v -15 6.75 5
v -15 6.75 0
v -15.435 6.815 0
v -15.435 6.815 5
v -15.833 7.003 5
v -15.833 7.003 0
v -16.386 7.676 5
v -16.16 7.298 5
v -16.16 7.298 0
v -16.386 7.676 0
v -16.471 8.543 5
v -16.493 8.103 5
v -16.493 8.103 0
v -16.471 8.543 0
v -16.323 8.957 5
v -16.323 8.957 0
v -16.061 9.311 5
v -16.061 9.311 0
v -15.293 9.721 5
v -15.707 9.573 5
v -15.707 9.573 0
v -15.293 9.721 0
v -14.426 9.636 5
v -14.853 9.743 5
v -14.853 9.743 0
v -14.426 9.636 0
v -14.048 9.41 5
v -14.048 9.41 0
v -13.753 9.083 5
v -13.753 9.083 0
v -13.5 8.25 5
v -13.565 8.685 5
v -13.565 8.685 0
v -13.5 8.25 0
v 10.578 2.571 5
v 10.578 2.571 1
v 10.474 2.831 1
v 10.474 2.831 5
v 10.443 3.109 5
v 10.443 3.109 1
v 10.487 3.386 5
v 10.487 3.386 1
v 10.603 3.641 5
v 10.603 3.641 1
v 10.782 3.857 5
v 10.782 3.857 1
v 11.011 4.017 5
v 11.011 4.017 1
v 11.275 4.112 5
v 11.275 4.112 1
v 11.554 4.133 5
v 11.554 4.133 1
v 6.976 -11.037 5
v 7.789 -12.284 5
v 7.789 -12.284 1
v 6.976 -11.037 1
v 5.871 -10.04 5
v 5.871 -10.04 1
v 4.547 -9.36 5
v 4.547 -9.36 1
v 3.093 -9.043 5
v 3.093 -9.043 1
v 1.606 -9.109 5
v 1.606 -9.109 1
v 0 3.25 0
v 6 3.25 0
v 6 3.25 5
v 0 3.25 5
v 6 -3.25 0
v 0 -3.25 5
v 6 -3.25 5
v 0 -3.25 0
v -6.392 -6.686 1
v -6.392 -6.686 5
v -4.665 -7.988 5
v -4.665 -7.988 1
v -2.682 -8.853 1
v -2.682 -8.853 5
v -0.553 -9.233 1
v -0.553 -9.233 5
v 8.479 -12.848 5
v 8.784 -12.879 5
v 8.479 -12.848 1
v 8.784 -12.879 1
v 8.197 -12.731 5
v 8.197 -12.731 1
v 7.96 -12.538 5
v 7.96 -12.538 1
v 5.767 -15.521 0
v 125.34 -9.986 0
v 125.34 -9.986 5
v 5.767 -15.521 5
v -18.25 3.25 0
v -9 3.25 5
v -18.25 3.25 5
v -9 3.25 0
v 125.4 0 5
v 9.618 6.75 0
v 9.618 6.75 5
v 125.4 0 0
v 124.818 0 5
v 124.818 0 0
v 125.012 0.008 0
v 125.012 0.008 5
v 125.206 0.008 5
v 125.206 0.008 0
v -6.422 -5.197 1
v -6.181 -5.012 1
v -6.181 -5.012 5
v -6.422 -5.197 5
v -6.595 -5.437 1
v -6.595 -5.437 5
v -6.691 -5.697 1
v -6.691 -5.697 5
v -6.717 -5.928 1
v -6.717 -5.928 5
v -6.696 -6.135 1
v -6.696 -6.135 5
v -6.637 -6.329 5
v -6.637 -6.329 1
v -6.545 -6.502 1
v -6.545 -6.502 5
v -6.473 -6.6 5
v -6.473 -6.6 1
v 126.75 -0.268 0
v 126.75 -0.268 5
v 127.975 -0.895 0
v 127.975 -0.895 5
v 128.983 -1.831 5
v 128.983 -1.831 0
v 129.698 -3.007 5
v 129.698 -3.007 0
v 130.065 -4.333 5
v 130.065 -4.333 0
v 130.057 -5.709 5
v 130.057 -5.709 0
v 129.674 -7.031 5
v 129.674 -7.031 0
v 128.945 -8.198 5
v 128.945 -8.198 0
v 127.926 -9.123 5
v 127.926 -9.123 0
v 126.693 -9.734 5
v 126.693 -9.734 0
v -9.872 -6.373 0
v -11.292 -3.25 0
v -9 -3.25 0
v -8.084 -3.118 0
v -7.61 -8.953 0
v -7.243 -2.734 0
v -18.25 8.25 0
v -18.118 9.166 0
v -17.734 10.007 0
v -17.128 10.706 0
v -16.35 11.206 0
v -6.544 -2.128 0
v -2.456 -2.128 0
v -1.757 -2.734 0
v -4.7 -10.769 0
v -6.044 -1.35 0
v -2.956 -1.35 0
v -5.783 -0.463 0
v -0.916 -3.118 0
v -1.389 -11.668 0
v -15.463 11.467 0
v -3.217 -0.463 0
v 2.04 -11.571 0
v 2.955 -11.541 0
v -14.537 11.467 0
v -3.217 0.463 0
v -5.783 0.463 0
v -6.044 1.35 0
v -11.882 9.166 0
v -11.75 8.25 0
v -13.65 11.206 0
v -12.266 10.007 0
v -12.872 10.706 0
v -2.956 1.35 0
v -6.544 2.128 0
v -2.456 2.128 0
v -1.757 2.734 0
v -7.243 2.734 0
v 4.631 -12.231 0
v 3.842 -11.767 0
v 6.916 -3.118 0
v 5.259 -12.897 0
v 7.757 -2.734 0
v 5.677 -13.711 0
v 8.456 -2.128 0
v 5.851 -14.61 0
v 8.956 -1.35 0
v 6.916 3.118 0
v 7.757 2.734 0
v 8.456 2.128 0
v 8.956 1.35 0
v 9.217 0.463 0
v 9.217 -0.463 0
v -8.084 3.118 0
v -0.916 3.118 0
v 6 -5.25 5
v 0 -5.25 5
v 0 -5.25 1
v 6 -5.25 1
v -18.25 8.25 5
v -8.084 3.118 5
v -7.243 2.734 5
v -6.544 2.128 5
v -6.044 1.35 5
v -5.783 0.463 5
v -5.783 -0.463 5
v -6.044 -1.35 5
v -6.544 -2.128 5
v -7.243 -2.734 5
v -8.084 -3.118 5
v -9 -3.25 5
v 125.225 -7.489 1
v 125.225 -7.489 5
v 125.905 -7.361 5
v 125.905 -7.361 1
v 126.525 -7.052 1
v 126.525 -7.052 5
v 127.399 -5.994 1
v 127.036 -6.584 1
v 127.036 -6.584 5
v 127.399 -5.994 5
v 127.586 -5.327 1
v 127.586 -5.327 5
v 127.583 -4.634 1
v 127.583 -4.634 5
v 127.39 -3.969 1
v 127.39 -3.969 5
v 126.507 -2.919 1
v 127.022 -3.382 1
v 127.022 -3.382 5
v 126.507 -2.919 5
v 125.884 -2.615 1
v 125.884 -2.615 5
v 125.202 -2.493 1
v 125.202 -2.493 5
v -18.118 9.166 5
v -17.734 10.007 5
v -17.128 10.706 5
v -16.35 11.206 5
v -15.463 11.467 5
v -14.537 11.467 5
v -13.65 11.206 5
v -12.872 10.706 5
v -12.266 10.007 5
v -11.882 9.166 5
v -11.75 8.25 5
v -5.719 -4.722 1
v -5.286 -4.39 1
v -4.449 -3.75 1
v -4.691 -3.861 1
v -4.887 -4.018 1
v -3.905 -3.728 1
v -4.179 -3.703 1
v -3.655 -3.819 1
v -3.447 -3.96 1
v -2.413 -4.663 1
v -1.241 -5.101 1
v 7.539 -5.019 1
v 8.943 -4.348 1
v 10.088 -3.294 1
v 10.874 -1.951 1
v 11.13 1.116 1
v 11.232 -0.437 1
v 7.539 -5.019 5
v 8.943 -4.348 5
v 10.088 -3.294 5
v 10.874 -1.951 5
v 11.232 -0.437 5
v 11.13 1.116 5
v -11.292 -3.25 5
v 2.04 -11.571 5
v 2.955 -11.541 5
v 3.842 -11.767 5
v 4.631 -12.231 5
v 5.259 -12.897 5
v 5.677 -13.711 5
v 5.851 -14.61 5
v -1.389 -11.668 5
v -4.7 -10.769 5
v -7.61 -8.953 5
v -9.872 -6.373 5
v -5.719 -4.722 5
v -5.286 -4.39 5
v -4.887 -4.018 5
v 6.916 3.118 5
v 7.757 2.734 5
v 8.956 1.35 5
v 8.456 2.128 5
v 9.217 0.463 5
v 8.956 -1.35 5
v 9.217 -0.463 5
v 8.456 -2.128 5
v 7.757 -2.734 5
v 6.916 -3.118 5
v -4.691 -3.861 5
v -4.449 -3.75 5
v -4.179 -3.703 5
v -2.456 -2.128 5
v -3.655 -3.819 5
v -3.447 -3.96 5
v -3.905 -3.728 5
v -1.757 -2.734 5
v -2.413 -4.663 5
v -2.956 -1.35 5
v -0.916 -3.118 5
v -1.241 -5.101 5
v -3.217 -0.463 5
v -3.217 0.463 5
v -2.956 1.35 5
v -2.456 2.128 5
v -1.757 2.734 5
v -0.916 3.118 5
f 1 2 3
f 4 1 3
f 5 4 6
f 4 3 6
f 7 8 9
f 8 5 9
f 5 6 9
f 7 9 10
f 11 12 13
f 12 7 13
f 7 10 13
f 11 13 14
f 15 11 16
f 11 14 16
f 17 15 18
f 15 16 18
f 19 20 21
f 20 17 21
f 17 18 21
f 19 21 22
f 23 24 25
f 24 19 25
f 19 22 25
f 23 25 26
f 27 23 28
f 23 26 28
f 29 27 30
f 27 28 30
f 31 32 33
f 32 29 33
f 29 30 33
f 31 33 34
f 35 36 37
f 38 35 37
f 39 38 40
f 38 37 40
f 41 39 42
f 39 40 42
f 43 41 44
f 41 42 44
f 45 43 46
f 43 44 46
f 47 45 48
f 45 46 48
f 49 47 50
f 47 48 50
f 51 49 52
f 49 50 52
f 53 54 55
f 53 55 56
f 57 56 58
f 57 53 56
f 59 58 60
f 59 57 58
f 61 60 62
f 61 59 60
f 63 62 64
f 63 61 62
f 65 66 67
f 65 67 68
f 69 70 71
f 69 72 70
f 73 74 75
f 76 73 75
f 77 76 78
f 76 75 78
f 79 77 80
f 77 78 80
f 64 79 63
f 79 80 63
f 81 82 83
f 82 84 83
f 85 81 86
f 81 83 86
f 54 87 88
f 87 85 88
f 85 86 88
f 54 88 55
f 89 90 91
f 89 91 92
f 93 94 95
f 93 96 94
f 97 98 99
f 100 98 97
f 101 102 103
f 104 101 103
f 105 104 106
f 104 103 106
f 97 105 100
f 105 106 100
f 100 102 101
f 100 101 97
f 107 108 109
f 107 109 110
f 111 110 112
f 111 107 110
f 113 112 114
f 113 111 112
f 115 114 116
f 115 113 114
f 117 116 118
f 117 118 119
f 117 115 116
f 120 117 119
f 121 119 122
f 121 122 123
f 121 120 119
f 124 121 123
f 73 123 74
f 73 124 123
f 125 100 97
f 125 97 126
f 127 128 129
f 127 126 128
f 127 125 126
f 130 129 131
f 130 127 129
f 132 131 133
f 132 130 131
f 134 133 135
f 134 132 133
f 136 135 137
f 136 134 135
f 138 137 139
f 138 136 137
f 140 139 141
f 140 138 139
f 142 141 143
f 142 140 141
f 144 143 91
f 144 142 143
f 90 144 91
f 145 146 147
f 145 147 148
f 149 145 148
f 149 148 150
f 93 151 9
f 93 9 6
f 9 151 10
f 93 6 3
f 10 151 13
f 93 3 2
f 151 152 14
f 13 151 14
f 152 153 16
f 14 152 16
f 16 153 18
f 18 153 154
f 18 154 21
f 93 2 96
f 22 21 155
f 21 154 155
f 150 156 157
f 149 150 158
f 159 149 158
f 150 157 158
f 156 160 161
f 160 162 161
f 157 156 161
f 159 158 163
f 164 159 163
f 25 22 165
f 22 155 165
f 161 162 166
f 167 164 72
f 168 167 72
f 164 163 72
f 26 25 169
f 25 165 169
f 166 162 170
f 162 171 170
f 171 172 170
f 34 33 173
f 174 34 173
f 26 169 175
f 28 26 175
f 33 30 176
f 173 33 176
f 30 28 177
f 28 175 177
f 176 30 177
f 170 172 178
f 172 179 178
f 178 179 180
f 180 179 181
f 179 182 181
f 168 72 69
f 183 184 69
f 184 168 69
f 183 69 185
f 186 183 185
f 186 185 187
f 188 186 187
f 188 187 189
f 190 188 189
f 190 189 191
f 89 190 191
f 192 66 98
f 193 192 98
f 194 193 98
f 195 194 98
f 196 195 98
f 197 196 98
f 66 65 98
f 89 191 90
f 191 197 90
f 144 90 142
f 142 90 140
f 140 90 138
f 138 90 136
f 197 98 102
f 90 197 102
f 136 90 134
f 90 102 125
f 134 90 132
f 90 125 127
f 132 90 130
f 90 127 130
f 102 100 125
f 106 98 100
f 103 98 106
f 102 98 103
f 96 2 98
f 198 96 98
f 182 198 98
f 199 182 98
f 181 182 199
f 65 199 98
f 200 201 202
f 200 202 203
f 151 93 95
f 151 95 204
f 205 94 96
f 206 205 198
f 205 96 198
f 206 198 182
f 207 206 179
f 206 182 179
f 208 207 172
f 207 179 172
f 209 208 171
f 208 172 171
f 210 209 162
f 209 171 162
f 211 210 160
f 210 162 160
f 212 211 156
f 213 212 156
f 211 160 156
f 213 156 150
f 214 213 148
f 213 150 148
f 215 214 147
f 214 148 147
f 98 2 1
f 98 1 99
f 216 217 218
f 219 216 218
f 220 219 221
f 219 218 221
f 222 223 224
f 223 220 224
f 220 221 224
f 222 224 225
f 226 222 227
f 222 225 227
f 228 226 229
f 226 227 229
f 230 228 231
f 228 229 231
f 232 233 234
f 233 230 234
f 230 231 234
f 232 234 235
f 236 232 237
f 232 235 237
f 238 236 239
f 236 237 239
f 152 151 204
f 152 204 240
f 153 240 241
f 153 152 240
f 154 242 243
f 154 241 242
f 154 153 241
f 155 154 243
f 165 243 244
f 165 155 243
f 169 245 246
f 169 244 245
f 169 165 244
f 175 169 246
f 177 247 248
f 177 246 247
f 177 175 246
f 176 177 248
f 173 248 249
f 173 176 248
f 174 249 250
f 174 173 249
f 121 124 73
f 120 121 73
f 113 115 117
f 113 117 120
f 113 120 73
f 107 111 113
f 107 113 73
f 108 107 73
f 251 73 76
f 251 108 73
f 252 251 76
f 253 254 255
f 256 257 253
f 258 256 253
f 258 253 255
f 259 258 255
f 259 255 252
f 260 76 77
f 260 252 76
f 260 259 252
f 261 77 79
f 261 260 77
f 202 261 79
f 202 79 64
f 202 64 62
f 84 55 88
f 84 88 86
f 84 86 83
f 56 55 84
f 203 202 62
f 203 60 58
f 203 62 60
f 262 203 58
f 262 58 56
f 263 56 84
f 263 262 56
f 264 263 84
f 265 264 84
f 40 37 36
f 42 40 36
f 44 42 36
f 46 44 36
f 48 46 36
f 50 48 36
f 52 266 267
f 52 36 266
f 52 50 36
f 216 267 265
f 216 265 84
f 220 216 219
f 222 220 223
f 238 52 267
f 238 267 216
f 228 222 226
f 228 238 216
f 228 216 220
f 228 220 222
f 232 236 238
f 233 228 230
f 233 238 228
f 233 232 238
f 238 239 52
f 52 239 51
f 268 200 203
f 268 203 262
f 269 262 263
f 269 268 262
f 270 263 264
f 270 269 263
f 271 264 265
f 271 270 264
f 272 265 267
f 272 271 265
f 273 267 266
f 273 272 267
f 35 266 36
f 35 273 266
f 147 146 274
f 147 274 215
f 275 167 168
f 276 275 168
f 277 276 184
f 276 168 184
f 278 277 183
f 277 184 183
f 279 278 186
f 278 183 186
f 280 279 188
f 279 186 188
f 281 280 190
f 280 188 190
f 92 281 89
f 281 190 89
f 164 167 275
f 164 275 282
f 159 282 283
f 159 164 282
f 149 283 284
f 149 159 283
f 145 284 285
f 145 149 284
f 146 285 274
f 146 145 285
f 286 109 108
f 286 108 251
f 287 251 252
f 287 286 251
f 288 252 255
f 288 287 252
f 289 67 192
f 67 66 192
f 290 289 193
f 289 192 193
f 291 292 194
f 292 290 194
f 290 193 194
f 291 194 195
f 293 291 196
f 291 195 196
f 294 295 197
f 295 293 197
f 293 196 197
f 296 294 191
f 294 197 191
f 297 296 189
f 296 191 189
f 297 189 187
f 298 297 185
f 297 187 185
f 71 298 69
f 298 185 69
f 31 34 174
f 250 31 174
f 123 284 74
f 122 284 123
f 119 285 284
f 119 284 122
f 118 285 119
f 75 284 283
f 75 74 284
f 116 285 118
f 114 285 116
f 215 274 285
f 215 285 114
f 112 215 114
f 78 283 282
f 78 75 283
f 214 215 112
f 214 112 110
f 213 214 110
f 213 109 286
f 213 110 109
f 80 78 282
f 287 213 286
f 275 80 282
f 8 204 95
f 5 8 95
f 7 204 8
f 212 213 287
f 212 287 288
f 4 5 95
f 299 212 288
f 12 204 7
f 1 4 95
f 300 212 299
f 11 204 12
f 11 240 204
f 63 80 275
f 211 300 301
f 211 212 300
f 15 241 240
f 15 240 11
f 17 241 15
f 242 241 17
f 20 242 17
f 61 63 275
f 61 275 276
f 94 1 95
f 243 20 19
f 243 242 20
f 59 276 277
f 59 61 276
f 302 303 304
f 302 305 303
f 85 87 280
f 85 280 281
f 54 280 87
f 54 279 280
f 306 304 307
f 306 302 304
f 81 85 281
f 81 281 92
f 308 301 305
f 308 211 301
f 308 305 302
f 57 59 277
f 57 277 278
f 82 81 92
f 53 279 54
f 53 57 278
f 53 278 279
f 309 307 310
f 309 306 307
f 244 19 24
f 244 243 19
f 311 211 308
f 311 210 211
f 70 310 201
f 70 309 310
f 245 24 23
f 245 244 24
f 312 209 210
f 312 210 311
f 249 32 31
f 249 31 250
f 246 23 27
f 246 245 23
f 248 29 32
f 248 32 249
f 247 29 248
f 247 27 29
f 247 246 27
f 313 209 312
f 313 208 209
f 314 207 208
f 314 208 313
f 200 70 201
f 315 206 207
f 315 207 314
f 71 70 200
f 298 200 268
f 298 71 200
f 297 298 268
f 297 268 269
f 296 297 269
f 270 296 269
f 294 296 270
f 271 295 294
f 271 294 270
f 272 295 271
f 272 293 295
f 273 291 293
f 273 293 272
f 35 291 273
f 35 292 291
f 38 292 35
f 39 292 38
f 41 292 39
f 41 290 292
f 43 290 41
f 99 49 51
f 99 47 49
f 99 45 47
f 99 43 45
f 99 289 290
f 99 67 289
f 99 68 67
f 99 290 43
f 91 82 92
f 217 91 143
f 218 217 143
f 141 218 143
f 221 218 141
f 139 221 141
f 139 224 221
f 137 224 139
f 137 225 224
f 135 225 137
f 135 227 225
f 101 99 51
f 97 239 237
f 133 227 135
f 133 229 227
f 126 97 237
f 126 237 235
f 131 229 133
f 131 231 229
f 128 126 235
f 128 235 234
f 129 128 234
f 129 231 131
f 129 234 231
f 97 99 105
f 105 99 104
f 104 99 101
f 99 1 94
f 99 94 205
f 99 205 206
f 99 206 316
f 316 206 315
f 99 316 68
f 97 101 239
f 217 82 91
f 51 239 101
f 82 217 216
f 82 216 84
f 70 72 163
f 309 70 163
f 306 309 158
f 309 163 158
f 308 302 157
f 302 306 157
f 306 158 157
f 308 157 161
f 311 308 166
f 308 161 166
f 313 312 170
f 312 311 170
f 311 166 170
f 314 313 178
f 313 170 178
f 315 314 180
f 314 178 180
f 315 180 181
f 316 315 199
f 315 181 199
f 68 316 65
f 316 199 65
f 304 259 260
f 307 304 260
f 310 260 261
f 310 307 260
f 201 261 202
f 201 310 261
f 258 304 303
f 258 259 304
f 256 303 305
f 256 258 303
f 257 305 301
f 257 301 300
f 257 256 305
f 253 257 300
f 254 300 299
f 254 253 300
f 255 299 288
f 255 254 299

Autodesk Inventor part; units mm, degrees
ref_plane "YZ Plane" through (0, 0, 0) normal (1, 0, 0) x (0, 1, 0)
ref_plane "XZ Plane" through (0, 0, 0) normal (0, 1, 0) x (-1, 0, 0)
ref_plane "XY Plane" through (0, 0, 0) normal (0, 0, 1) x (1, 0, 0)
sketch "スケッチ1" plane through (0, 0, 0) normal (0, 0, 1) x (1, 0, 0)
  line L0 (0, 0) -> (6, 0) construction
  line L1 (0, -3.25) -> (6, -3.25)
  line L2 (6, 3.25) -> (0, 3.25)
  arc A0 (0, 3.25) -> (0, -3.25) centre (0, 0) ccw
  arc A1 (6, -3.25) -> (6, 3.25) centre (6, 0) ccw
  line L3 (-15, 0) -> (-9, 0) construction
  line L4 (-9, 3.25) -> (-15, 3.25)
  arc A2 (-15, 3.25) -> (-18.25, 0) centre (-15, 0) ccw
  arc A3 (-9, -3.25) -> (-9, 3.25) centre (-9, 0) ccw
  line L5 (-9, 0) -> (0, 0)
  circle A4 centre (-15, 0) radius 3.25 construction
  circle A5 centre (2.604723, -14.772116) radius 3.25
  line L6 (0, 0) -> (2.604723, -14.772116) construction
  arc A6 (-11.29159, -3.25) -> (2.040366, -11.571491) centre (0, 0) ccw
  line L7 (0, 0) -> (125.4, 0)
  line L8 (125.340198, -9.986176) -> (5.767236, -15.521122)
  line L9 (-11.29159, -3.25) -> (-9, -3.25)
  arc A7 (-13.5, 8.25) -> (-15, 6.75) centre (-15, 8.25) ccw
  line L10 (-15, 8.25) -> (-15, 6.75) construction
  line L11 (-15, 3.25) -> (-18.25, 3.25)
  line L12 (-18.25, 3.25) -> (-18.25, 8.25)
  line L13 (-13.5, 8.25) -> (-11.75, 8.25)
  line L14 (-15, 6.75) -> (-9.617692, 6.75)
  arc A8 (-11.75, 0) -> (-11.29159, -3.25) centre (0, 0) ccw
  arc A9 (2.040366, -11.571491) -> (-11.75, 0) centre (0, 0) ccw construction
  line L15 (9.617692, 6.75) -> (125.4, 0)
  line L16 (-9.617692, 6.75) -> (9.617692, 6.75)
  line L17 (-15, 6.75) -> (-15, 0) construction
  arc A10 (-11.75, 8.25) -> (-18.25, 8.25) centre (-15, 8.25) ccw
  circle A11 centre (125.108999, -4.991525) radius 5
  point P0 (3, 0)
  point P1 (-12, 0)
  point P2 (2.040366, -11.571491)
  point P3 (124.817998, 0)
  dimension "d6" = 6.5
  dimension "d7" = 6.5
  dimension "d0" = 6.5
  dimension "d1" = 6
  dimension "d3" = 6.5
  dimension "d4" = 6
  dimension "d5" = 15
  dimension "d8" = 15
  dimension "d9" = 100
  dimension "d11" = 125.4
  dimension "d12" = 3
  dimension "d13" = 5
  dimension "d14" = 3.25
  dimension "d15" = 6.5
  dimension "d18" = 10
extrude "押し出し1" add sketch "スケッチ1" along normal blind 5 contours L1 A1 L7 A11 L8 A5 A6 L9 A3 L5 A0 | L5 A3 L4 L11 L12 A10 L13 A7 L14 L16 L15 A11 L7 A1 L2 A0 | L7 A11 picked at (123.673178, -4.767327)
sketch "スケッチ2" plane through (0, 0, 5) normal (0, 0, 1) x (1, 0, 0)
  arc A0 (-15, 6.75) -> (-13.5, 8.25) centre (-15, 8.25) ccw
  line L0 (-13.5, 8.25) -> (-11.75, 8.25)
  arc A1 (-11.75, 8.25) -> (-18.25, 8.25) centre (-15, 8.25) ccw
  line L1 (-18.25, 8.25) -> (-18.25, 3.25)
  arc A2 (-9, 3.25) -> (-9, -3.25) centre (-9, 0) ccw
  line L2 (-9, -3.25) -> (-11.29159, -3.25)
  arc A3 (-11.29159, -3.25) -> (2.040366, -11.571491) centre (0, 0) ccw
  arc A4 (2.040366, -11.571491) -> (5.767236, -15.521122) centre (2.604723, -14.772116) ccw
  line L3 (5.767236, -15.521122) -> (125.340198, -9.986176)
  arc A5 (125.340198, -9.986176) -> (125.4, 0) centre (125.108999, -4.991525) ccw
  line L4 (125.4, 0) -> (124.817998, 0)
  line L5 (124.817998, 0) -> (125.4, 0)
  line L6 (125.4, 0) -> (9.617692, 6.75)
  line L7 (0, 3.25) -> (6, 3.25)
  arc A6 (6, 3.25) -> (6, -3.25) centre (6, 0) ccw
  line L8 (6, -3.25) -> (0, -3.25)
  arc A7 (0, -3.25) -> (0, 3.25) centre (0, 0) ccw
  arc A8 (125.224598, -7.488851) -> (125.202485, -2.493273) centre (125.108999, -4.991525) ccw
  line L9 (125.224598, -7.488851) -> (8.045869, -12.912969)
  arc A9 (8.045869, -12.912969) -> (1.606246, -9.109472) centre (2.604723, -14.772116) ccw
  arc A10 (-7.416667, -5.527708) -> (1.606246, -9.109472) centre (0, 0) ccw
  arc A11 (-7.416667, -5.527708) -> (-9, 5.75) centre (-9, 0) ccw
  line L10 (125.254499, -2.495762) -> (9.041316, 4.279357)
  line L11 (6, 5.25) -> (0, 5.25)
  arc A12 (0, 5.25) -> (0, -5.25) centre (0, 0) ccw
  line L12 (0, -5.25) -> (6, -5.25)
  arc A13 (6, -5.25) -> (6, 5.25) centre (6, 0) ccw
  point P0 (-4.194444, -3.157394)
  point P1 (125.254499, -2.495762)
  point P2 (9.678702, 3.745617)
  point P3 (-4.194444, 3.157394)
  dimension "d19" = 2.5
  dimension "d20" = 2.5
  dimension "d21" = 2
extrude "押し出し2" cut sketch "スケッチ2" against normal blind 4 contours L9 A9 A10 A11 A12 L12 A13 L10 A8
fillet "フィレット1" radius 1.05 4 edges at (8.0459, -12.913, 3) (-7.4167, -5.5277, 3) (-4.1944, -3.1574, 3) (9.0413, 4.2794, 3)
properties part number "ウィング" material "ポリカーボネート、クリア"
